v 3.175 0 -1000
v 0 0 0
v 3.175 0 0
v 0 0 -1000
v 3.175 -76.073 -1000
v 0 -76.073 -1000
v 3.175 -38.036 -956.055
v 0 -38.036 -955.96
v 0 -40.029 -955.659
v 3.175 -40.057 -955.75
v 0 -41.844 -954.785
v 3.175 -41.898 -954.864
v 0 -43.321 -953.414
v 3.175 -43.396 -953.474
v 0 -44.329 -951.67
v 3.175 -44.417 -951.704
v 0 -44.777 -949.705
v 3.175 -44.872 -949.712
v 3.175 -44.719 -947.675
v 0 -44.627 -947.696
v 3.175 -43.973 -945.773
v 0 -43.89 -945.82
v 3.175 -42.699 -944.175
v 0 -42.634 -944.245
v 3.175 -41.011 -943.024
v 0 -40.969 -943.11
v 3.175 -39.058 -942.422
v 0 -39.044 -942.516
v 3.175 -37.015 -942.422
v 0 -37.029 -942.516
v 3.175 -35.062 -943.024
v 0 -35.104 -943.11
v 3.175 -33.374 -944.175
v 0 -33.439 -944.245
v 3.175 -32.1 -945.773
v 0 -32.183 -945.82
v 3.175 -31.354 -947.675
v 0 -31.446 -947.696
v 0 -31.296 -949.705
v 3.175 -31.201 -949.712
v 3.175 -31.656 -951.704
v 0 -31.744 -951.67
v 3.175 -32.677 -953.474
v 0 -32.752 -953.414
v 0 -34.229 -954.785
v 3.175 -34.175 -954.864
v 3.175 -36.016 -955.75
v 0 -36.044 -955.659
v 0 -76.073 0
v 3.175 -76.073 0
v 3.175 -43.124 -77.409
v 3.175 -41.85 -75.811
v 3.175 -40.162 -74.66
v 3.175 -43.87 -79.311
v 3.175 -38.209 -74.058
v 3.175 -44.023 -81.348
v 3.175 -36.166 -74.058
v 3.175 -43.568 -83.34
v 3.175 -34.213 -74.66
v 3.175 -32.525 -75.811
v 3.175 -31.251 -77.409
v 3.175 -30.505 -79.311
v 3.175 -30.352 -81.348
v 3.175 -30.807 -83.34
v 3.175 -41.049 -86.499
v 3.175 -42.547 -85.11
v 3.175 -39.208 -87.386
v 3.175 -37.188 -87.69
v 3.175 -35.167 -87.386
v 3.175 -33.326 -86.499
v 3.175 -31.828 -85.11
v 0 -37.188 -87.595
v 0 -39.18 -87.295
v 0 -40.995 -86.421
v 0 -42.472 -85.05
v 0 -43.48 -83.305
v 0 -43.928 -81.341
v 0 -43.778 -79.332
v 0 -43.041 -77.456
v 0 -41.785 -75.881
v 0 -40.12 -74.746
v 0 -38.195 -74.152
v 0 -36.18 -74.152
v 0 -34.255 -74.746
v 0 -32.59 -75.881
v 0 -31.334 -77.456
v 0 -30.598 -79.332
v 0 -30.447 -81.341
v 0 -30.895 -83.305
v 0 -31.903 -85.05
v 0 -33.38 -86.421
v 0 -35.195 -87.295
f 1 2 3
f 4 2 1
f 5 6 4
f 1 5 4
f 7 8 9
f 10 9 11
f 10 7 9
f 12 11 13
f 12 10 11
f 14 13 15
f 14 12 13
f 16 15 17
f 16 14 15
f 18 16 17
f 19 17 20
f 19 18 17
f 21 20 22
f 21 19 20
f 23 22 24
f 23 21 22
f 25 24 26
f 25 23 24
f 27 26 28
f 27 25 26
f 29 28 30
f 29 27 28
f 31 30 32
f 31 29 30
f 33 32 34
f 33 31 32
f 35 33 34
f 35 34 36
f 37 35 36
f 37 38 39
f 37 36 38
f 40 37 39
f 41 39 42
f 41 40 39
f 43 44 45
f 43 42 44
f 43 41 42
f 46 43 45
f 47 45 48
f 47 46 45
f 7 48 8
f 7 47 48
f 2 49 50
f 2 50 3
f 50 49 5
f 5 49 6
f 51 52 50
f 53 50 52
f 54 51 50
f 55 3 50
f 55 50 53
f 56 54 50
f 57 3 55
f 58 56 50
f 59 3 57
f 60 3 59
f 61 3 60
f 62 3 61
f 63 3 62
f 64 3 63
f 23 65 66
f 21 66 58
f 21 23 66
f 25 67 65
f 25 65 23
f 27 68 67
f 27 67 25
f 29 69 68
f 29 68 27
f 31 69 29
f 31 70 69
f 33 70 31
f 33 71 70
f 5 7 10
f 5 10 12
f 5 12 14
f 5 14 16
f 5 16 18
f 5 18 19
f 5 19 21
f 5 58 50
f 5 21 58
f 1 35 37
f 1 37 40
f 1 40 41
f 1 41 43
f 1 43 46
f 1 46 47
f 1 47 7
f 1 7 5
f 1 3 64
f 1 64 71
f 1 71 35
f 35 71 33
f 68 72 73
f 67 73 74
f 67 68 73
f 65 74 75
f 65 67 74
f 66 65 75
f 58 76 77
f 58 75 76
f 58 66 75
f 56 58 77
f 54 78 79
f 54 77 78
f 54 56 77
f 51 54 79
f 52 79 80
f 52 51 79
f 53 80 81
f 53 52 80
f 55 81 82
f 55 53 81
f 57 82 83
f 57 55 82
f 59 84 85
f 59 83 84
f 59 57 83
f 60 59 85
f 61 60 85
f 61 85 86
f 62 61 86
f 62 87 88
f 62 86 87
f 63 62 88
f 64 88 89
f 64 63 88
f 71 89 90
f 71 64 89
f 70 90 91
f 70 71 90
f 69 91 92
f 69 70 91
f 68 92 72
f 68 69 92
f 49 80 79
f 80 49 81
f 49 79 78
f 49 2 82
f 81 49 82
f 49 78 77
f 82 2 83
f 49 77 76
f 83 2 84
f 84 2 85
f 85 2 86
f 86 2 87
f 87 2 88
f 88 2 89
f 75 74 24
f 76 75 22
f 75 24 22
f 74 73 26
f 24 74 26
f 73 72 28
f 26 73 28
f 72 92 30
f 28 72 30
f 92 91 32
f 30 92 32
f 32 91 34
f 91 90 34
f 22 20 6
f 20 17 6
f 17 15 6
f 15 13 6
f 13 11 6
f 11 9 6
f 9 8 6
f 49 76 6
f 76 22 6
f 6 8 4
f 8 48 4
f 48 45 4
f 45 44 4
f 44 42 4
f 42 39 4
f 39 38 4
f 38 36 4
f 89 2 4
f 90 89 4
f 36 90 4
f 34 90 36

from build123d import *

# Parameters (mm, degrees)
SKETCH1_W           = 999.999999996
SKETCH1_H           = 76.073
BOSS_EXTRUDE1_DEPTH = 3.175


with BuildPart() as part:
    # Sketch1 → Boss-Extrude1 (new body)
    with BuildSketch(Plane(origin=(0, 0, 0), x_dir=(0, 0, -1), z_dir=(1, 0, 0))):
        with Locations((499.999999998, -38.0365)):
            Rectangle(SKETCH1_W, SKETCH1_H)
    extrude(amount=BOSS_EXTRUDE1_DEPTH)

    # Sketch13 → 1/4 NPT Tapped Hole3 (revolve, cut)
    with BuildSketch(Plane(origin=(3.175, -37.187581484, -80.83584166), x_dir=(0, 0, -1), z_dir=(0, 1, 0))):
        Polygon((0, 0), (0, 3.175), (5.5626, 3.175), (5.5626, 9.906), (6.557984794, 9.906), (6.8545837, 0), align=None)
    revolve(axis=Axis((9.525, -37.187581484, -80.83584166), (-1, 0, 0)), mode=Mode.SUBTRACT)

    # Sketch15 → 1/4 NPT Tapped Hole4 (revolve, cut)
    with BuildSketch(Plane(origin=(3.175, -38.0365, -949.199999996), x_dir=(0, 0, -1), z_dir=(0, 1, 0))):
        Polygon((0, 0), (0, 3.175), (5.5626, 3.175), (5.5626, 9.906), (6.557984794, 9.906), (6.8545837, 0), align=None)
    revolve(axis=Axis((9.525, -38.0365, -949.199999996), (-1, 0, 0)), mode=Mode.SUBTRACT)


solid = part.part
